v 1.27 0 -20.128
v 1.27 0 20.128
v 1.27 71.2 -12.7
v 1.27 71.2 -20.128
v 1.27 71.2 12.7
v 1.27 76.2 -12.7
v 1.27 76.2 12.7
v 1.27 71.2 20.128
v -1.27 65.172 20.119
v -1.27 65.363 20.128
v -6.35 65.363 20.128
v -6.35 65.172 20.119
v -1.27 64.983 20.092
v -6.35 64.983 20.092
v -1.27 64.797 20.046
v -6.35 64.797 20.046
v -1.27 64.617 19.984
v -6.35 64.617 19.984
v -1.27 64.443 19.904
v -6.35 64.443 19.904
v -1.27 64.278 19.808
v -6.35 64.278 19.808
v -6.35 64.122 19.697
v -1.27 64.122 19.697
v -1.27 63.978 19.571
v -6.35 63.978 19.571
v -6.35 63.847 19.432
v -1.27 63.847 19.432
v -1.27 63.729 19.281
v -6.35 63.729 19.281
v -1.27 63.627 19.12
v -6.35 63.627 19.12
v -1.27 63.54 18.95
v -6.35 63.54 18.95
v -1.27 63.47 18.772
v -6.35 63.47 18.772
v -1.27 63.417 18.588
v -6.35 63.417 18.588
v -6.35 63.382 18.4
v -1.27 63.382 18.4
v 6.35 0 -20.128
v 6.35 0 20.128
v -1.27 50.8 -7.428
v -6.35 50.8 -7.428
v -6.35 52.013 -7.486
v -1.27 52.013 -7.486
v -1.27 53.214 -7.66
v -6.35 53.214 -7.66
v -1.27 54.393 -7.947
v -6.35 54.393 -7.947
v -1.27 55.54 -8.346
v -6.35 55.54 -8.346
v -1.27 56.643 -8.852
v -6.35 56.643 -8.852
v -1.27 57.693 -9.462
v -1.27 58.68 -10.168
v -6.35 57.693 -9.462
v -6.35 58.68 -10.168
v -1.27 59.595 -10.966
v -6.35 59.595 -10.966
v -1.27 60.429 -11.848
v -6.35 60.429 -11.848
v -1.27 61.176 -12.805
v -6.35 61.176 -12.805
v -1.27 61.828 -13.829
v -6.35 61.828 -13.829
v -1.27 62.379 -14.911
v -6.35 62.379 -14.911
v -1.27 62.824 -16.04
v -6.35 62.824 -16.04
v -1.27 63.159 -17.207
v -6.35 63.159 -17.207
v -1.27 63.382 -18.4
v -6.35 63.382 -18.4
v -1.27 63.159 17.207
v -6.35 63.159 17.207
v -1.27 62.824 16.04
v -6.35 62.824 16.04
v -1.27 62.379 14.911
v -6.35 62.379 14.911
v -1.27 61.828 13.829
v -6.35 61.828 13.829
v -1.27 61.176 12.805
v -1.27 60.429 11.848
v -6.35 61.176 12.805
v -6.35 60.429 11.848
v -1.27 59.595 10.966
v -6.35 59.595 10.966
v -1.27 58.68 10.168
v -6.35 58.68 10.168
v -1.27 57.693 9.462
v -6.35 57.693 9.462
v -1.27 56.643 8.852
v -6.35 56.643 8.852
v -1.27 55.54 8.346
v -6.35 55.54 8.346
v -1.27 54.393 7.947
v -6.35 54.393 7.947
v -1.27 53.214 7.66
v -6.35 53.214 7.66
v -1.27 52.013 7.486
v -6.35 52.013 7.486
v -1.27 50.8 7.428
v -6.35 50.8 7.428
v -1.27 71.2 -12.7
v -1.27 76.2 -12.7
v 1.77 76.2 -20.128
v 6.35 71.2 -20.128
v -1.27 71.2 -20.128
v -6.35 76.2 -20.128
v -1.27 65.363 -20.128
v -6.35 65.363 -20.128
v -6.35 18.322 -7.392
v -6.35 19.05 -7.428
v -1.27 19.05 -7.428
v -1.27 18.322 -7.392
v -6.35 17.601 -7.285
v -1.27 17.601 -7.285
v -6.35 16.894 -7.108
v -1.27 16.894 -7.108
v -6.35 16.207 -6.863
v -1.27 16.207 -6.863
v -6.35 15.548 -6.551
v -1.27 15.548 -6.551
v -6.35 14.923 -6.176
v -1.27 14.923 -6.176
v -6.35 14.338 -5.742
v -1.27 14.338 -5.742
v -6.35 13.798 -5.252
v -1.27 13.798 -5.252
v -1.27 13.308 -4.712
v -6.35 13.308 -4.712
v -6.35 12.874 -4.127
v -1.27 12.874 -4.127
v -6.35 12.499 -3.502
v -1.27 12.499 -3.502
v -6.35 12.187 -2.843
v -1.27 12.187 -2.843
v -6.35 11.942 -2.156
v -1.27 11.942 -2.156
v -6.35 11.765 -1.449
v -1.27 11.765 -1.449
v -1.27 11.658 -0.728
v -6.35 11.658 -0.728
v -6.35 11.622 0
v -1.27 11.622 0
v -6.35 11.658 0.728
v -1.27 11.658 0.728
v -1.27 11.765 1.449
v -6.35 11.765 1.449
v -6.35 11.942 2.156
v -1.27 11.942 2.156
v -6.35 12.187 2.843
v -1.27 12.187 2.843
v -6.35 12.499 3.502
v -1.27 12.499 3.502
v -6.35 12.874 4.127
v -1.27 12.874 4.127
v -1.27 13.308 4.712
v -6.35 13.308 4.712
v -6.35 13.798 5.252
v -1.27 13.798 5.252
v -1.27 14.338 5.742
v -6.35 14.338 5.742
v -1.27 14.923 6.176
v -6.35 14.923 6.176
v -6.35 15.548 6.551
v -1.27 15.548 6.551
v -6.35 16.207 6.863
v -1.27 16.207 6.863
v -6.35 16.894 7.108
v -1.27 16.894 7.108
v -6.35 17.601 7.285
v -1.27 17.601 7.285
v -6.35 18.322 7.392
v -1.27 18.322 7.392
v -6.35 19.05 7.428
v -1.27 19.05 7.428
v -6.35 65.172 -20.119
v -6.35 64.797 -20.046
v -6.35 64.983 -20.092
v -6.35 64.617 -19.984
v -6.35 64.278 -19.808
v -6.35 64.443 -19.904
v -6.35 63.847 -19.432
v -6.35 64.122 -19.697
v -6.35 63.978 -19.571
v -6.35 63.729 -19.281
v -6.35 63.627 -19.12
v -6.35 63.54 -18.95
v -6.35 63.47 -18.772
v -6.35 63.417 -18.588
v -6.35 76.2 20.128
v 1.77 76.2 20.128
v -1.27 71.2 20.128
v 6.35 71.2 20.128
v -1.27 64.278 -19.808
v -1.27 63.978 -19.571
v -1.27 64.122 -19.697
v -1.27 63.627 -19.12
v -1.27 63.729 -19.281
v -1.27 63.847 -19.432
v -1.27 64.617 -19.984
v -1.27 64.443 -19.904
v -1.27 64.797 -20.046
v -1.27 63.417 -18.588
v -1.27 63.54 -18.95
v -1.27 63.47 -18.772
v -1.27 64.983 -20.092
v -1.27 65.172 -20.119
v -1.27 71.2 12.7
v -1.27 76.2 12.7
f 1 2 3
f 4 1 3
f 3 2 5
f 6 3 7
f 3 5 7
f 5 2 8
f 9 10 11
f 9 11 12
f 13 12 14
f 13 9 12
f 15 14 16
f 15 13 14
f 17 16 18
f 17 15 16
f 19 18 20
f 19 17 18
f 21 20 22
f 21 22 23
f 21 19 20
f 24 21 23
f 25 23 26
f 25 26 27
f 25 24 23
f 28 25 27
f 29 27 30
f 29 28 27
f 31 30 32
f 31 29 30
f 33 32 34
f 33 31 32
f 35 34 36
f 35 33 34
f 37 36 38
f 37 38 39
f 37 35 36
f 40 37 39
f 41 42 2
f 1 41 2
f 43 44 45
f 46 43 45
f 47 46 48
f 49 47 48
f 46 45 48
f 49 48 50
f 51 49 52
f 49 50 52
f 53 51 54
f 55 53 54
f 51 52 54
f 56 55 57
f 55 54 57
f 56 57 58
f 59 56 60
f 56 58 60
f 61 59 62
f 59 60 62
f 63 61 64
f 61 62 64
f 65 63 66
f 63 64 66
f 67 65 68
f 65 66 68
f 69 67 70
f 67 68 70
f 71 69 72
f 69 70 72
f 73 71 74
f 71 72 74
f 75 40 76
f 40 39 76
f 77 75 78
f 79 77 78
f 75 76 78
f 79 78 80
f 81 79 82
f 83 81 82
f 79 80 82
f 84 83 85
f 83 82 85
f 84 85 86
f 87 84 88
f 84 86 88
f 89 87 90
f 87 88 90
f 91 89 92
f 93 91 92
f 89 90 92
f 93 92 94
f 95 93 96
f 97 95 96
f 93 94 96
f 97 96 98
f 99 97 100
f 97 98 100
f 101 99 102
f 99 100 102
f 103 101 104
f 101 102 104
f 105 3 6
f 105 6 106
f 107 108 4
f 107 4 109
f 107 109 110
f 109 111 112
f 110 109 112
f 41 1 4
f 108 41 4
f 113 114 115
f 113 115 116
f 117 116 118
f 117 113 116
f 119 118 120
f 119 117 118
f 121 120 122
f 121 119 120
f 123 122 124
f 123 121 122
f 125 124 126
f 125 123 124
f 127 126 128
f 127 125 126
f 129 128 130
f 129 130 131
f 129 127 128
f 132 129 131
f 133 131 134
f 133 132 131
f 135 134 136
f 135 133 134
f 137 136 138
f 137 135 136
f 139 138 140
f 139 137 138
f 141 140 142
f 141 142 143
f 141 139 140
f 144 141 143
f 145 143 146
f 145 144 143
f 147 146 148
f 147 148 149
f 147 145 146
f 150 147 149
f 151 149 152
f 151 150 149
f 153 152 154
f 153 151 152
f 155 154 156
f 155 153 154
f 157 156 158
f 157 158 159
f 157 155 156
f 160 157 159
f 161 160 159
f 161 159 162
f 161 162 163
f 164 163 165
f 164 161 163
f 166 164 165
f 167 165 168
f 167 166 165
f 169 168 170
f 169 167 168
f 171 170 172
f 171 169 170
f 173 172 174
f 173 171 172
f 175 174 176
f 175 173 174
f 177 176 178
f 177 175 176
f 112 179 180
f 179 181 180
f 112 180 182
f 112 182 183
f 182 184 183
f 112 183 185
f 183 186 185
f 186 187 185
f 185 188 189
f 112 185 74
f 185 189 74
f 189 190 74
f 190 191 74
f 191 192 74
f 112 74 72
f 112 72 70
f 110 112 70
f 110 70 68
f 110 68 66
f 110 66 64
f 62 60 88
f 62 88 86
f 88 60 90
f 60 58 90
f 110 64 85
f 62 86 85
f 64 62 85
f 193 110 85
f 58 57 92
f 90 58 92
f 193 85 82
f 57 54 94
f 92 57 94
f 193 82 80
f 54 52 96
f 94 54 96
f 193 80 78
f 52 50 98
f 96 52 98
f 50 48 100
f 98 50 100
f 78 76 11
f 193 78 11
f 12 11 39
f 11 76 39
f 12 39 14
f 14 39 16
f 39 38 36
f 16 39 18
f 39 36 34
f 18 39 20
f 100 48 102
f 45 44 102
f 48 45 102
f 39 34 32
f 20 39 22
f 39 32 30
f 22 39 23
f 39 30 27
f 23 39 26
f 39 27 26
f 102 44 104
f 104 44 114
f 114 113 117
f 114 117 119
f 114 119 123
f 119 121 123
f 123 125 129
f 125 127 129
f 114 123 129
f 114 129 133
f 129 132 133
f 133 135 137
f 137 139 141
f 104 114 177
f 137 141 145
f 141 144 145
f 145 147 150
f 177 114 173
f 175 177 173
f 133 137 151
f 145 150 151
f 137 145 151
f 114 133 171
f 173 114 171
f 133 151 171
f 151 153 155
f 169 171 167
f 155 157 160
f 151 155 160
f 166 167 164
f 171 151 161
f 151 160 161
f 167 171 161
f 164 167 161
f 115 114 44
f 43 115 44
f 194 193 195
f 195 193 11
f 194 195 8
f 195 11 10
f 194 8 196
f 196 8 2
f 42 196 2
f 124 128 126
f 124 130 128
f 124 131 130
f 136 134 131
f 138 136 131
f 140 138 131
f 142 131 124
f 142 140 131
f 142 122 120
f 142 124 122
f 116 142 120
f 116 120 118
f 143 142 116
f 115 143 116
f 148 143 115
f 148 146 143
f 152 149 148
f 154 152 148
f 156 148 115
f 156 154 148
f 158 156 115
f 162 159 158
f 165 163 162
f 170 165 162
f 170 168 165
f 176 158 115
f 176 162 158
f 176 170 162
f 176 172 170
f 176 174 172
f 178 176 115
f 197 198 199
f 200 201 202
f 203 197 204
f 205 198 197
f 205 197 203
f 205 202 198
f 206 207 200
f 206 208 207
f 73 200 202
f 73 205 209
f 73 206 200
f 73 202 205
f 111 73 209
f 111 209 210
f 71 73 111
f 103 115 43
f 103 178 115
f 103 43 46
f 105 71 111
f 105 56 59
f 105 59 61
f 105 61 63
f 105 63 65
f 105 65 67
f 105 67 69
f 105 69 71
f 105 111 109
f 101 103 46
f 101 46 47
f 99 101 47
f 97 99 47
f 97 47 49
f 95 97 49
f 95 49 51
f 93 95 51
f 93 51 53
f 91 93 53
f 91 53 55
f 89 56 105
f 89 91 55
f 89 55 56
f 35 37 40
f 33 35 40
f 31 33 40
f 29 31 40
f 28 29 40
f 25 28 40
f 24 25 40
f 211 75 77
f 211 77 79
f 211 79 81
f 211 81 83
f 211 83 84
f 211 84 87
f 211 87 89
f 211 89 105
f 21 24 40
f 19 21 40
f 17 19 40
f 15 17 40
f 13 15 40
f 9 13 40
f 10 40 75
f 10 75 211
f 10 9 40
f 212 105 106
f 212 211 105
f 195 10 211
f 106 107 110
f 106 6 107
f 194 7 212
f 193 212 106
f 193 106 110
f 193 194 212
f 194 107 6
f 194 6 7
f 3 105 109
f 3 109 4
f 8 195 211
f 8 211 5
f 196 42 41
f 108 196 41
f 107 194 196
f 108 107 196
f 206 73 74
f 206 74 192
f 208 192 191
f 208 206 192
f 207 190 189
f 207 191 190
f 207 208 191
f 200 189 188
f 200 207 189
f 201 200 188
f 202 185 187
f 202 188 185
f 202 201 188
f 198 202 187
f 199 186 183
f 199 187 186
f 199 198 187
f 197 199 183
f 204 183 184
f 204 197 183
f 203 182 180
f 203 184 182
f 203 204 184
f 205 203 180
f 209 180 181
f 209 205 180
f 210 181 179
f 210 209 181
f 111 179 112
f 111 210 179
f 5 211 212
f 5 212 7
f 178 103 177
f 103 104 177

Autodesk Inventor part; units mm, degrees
ref_plane "YZ Plane" through (0, 0, 0) normal (1, 0, 0) x (0, 1, 0)
ref_plane "XZ Plane" through (0, 0, 0) normal (0, 1, 0) x (-1, 0, 0)
ref_plane "XY Plane" through (0, 0, 0) normal (0, 0, 1) x (1, 0, 0)
sketch "Sketch1" plane through (0, 0, 0) normal (0, 1, 0) x (-1, 0, 0)
  line L0 (-1.27, -12.7) -> (1.27, -12.7)
  line L1 (1.27, -12.7) -> (1.27, 12.7)
  line L2 (1.27, 12.7) -> (-1.27, 12.7)
  line L3 (-1.27, 12.7) -> (-1.27, -12.7)
  line L4 (-1.27, -12.7) -> (1.27, 12.7) construction
  line L5 (1.27, -12.7) -> (-1.27, 12.7) construction
  line L6 (-6.35, -20.1281) -> (6.35, -20.1281)
  line L7 (6.35, -20.1281) -> (6.35, 20.1281)
  line L8 (6.35, 20.1281) -> (-6.35, 20.1281)
  line L9 (-6.35, 20.1281) -> (-6.35, -20.1281)
  line L10 (-6.35, -20.1281) -> (6.35, 20.1281) construction
  line L11 (6.35, -20.1281) -> (-6.35, 20.1281) construction
  point P0 (0, 0)
  dimension "d0" = 2.54
  dimension "d1" = 25.4
  dimension "d2" = 12.7
extrude "Extrusion1" add sketch "Sketch1" along normal blind 76.2
sketch "Sketch2" plane through (-6.35, 0, 20.1281) normal (0, 0, 1) x (1, 0, 0)
  line L0 (5.08, 0) -> (5.08, 76.2) projected
  line L1 (7.62, 0) -> (7.62, 76.2) projected
  line L2 (0, 0) -> (12.7, 0) projected
  line L3 (0, 76.2) -> (12.7, 76.2) projected
  line L4 (5.08, 0) -> (5.08, 76.2) projected
  line L5 (5.08, 71.2) -> (7.62, 71.2)
  line L6 (8.12, 76.2) -> (12.7, 71.2)
  line L7 (12.7, 0) -> (12.7, 76.2) projected
  point P0 (6.35, 0)
  dimension "d5" = 5
  dimension "d6" = 0.5
  dimension "d7" = 5
extrude "Extrusion2" cut sketch "Sketch2" against normal through all contours L0 L5 L1 L2 | L6 L3 L7
sketch "Sketch3" plane through (-6.35, 0, -20.1281) normal (-1, 0, 0) x (0, 0, 1)
  line L0 (40.2562, 0) -> (40.2562, 71.2) projected
  arc A0 (40.2562, 63.5) -> (27.5562, 50.8) centre (40.2562, 50.8) ccw
  line L1 (27.5562, 50.8) -> (27.5562, 19.05)
  line L2 (0, 76.2) -> (40.2562, 76.2) projected
  arc A1 (12.7, 19.05) -> (27.5562, 19.05) centre (20.1281, 19.05) ccw
  line L3 (0, 0) -> (0, 76.2) projected
  arc A2 (12.7, 50.8) -> (0, 63.5) centre (0, 50.8) ccw
  line L4 (12.7, 19.05) -> (12.7, 50.8)
  line L5 (0, 0) -> (40.2562, 0) projected
  point P0 (20.1281, 0)
  point P1 (20.1281, 0)
  dimension "d10" = 12.7
  dimension "d11" = 25.4
  dimension "d13" = 19.05
extrude "Extrusion3" cut sketch "Sketch3" against normal up to surface (5.08 mm away)
fillet "Fillet1" radius 2 2 edges at (-3.81, 63.5, 20.1281) (-3.81, 63.5, -20.1281)
properties part number "Glass Slide Gripper"
